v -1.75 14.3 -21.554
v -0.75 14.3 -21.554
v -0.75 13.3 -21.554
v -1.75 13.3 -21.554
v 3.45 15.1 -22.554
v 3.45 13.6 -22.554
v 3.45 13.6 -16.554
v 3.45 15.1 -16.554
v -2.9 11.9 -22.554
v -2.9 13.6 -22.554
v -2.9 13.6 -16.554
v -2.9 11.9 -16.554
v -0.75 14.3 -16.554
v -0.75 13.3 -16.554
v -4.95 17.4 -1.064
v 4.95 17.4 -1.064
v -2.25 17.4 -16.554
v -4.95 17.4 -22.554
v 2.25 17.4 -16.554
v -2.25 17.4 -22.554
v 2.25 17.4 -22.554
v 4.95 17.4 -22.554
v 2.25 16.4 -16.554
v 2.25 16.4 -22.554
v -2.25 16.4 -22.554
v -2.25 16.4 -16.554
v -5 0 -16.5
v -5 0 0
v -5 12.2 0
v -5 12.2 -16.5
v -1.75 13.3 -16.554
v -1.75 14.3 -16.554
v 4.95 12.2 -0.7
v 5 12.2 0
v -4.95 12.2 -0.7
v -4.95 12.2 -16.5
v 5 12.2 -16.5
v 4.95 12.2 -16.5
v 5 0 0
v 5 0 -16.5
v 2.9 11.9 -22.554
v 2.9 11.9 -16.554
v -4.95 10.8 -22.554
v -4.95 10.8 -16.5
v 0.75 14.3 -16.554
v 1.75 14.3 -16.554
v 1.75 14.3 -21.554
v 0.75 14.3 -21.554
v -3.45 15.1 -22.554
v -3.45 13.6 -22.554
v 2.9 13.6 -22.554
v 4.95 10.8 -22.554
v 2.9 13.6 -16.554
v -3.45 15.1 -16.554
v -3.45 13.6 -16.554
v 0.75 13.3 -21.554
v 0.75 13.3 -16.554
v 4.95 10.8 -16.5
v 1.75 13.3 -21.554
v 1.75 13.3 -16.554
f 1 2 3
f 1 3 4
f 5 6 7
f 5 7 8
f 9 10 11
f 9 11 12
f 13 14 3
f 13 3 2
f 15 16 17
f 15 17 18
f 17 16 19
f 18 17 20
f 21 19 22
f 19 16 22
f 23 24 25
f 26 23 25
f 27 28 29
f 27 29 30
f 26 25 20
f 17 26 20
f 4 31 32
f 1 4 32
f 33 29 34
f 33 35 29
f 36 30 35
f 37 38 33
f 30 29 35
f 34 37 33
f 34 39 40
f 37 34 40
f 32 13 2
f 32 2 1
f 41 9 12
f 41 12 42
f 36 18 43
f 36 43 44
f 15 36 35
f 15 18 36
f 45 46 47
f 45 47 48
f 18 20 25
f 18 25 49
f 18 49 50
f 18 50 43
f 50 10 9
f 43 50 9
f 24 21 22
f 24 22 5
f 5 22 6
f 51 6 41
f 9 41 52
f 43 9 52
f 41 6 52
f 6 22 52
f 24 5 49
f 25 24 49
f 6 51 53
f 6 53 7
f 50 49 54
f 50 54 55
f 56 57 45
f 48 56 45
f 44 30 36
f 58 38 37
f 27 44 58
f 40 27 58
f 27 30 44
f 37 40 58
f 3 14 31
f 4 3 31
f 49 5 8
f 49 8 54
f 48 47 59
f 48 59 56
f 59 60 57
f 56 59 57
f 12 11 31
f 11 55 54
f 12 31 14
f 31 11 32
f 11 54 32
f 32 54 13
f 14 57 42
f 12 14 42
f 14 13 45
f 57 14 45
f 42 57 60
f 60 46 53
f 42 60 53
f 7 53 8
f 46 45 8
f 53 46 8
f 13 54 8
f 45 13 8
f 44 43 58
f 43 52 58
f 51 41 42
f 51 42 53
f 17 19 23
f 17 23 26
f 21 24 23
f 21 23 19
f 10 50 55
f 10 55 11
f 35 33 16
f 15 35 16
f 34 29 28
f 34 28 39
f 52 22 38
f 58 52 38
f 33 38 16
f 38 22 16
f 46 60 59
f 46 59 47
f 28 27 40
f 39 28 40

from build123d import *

# Parameters (mm, degrees)
SKETCH1_W       = 10
SKETCH1_H       = 16.5
MAIN_BODY_DEPTH = 12.2
M_BASE_DEPTH    = 4.95
SKETCH12_W      = 4.5
SKETCH12_H      = 1
MO_CUT_1_DEPTH  = 6
SKETCH13_W      = 1
SKETCH13_H      = 1
MO_PINS_DEPTH   = 5


with BuildPart() as part:
    # Sketch1 → Main_Body (new body)
    with BuildSketch(Plane(origin=(0, 0, 0), x_dir=(1, 0, 0), z_dir=(0, 1, 0))):
        with Locations((0, 8.25)):
            Rectangle(SKETCH1_W, SKETCH1_H)
    extrude(amount=MAIN_BODY_DEPTH)

    # Sketch11 → M_Base (add, symmetric)
    with BuildSketch(Plane(origin=(0, 0, 0), x_dir=(0, 0, -1), z_dir=(1, 0, 0))):
        Polygon((0.7, 12.2), (1.063619422, 17.4), (22.553619422, 17.4), (22.553619422, 10.8), (16.5, 10.8), (16.5, 12.2), align=None)
    extrude(amount=M_BASE_DEPTH, both=True)

    # Sketch12 → MO_Cut_1 (cut)
    with BuildSketch(Plane(origin=(0, 0, -22.553619422), x_dir=(-1, 0, 0), z_dir=(0, 0, -1))):
        with Locations((0, 16.9)):
            Rectangle(SKETCH12_W, SKETCH12_H)
        Polygon((-3.45, 15.1), (3.45, 15.1), (3.45, 13.6), (2.9, 13.6), (2.9, 11.9), (-2.9, 11.9), (-2.9, 13.6), (-3.45, 13.6), align=None)
    extrude(amount=-MO_CUT_1_DEPTH, mode=Mode.SUBTRACT)

    # Sketch13 → MO_Pins (add)
    with BuildSketch(Plane(origin=(0, 0, -16.553619422), x_dir=(-1, 0, 0), z_dir=(0, 0, -1))):
        with Locations((-1.25, 13.8)):
            Rectangle(SKETCH13_W, SKETCH13_H)
        with Locations((1.25, 13.8)):
            Rectangle(SKETCH13_W, SKETCH13_H)
    extrude(amount=MO_PINS_DEPTH)


solid = part.part
